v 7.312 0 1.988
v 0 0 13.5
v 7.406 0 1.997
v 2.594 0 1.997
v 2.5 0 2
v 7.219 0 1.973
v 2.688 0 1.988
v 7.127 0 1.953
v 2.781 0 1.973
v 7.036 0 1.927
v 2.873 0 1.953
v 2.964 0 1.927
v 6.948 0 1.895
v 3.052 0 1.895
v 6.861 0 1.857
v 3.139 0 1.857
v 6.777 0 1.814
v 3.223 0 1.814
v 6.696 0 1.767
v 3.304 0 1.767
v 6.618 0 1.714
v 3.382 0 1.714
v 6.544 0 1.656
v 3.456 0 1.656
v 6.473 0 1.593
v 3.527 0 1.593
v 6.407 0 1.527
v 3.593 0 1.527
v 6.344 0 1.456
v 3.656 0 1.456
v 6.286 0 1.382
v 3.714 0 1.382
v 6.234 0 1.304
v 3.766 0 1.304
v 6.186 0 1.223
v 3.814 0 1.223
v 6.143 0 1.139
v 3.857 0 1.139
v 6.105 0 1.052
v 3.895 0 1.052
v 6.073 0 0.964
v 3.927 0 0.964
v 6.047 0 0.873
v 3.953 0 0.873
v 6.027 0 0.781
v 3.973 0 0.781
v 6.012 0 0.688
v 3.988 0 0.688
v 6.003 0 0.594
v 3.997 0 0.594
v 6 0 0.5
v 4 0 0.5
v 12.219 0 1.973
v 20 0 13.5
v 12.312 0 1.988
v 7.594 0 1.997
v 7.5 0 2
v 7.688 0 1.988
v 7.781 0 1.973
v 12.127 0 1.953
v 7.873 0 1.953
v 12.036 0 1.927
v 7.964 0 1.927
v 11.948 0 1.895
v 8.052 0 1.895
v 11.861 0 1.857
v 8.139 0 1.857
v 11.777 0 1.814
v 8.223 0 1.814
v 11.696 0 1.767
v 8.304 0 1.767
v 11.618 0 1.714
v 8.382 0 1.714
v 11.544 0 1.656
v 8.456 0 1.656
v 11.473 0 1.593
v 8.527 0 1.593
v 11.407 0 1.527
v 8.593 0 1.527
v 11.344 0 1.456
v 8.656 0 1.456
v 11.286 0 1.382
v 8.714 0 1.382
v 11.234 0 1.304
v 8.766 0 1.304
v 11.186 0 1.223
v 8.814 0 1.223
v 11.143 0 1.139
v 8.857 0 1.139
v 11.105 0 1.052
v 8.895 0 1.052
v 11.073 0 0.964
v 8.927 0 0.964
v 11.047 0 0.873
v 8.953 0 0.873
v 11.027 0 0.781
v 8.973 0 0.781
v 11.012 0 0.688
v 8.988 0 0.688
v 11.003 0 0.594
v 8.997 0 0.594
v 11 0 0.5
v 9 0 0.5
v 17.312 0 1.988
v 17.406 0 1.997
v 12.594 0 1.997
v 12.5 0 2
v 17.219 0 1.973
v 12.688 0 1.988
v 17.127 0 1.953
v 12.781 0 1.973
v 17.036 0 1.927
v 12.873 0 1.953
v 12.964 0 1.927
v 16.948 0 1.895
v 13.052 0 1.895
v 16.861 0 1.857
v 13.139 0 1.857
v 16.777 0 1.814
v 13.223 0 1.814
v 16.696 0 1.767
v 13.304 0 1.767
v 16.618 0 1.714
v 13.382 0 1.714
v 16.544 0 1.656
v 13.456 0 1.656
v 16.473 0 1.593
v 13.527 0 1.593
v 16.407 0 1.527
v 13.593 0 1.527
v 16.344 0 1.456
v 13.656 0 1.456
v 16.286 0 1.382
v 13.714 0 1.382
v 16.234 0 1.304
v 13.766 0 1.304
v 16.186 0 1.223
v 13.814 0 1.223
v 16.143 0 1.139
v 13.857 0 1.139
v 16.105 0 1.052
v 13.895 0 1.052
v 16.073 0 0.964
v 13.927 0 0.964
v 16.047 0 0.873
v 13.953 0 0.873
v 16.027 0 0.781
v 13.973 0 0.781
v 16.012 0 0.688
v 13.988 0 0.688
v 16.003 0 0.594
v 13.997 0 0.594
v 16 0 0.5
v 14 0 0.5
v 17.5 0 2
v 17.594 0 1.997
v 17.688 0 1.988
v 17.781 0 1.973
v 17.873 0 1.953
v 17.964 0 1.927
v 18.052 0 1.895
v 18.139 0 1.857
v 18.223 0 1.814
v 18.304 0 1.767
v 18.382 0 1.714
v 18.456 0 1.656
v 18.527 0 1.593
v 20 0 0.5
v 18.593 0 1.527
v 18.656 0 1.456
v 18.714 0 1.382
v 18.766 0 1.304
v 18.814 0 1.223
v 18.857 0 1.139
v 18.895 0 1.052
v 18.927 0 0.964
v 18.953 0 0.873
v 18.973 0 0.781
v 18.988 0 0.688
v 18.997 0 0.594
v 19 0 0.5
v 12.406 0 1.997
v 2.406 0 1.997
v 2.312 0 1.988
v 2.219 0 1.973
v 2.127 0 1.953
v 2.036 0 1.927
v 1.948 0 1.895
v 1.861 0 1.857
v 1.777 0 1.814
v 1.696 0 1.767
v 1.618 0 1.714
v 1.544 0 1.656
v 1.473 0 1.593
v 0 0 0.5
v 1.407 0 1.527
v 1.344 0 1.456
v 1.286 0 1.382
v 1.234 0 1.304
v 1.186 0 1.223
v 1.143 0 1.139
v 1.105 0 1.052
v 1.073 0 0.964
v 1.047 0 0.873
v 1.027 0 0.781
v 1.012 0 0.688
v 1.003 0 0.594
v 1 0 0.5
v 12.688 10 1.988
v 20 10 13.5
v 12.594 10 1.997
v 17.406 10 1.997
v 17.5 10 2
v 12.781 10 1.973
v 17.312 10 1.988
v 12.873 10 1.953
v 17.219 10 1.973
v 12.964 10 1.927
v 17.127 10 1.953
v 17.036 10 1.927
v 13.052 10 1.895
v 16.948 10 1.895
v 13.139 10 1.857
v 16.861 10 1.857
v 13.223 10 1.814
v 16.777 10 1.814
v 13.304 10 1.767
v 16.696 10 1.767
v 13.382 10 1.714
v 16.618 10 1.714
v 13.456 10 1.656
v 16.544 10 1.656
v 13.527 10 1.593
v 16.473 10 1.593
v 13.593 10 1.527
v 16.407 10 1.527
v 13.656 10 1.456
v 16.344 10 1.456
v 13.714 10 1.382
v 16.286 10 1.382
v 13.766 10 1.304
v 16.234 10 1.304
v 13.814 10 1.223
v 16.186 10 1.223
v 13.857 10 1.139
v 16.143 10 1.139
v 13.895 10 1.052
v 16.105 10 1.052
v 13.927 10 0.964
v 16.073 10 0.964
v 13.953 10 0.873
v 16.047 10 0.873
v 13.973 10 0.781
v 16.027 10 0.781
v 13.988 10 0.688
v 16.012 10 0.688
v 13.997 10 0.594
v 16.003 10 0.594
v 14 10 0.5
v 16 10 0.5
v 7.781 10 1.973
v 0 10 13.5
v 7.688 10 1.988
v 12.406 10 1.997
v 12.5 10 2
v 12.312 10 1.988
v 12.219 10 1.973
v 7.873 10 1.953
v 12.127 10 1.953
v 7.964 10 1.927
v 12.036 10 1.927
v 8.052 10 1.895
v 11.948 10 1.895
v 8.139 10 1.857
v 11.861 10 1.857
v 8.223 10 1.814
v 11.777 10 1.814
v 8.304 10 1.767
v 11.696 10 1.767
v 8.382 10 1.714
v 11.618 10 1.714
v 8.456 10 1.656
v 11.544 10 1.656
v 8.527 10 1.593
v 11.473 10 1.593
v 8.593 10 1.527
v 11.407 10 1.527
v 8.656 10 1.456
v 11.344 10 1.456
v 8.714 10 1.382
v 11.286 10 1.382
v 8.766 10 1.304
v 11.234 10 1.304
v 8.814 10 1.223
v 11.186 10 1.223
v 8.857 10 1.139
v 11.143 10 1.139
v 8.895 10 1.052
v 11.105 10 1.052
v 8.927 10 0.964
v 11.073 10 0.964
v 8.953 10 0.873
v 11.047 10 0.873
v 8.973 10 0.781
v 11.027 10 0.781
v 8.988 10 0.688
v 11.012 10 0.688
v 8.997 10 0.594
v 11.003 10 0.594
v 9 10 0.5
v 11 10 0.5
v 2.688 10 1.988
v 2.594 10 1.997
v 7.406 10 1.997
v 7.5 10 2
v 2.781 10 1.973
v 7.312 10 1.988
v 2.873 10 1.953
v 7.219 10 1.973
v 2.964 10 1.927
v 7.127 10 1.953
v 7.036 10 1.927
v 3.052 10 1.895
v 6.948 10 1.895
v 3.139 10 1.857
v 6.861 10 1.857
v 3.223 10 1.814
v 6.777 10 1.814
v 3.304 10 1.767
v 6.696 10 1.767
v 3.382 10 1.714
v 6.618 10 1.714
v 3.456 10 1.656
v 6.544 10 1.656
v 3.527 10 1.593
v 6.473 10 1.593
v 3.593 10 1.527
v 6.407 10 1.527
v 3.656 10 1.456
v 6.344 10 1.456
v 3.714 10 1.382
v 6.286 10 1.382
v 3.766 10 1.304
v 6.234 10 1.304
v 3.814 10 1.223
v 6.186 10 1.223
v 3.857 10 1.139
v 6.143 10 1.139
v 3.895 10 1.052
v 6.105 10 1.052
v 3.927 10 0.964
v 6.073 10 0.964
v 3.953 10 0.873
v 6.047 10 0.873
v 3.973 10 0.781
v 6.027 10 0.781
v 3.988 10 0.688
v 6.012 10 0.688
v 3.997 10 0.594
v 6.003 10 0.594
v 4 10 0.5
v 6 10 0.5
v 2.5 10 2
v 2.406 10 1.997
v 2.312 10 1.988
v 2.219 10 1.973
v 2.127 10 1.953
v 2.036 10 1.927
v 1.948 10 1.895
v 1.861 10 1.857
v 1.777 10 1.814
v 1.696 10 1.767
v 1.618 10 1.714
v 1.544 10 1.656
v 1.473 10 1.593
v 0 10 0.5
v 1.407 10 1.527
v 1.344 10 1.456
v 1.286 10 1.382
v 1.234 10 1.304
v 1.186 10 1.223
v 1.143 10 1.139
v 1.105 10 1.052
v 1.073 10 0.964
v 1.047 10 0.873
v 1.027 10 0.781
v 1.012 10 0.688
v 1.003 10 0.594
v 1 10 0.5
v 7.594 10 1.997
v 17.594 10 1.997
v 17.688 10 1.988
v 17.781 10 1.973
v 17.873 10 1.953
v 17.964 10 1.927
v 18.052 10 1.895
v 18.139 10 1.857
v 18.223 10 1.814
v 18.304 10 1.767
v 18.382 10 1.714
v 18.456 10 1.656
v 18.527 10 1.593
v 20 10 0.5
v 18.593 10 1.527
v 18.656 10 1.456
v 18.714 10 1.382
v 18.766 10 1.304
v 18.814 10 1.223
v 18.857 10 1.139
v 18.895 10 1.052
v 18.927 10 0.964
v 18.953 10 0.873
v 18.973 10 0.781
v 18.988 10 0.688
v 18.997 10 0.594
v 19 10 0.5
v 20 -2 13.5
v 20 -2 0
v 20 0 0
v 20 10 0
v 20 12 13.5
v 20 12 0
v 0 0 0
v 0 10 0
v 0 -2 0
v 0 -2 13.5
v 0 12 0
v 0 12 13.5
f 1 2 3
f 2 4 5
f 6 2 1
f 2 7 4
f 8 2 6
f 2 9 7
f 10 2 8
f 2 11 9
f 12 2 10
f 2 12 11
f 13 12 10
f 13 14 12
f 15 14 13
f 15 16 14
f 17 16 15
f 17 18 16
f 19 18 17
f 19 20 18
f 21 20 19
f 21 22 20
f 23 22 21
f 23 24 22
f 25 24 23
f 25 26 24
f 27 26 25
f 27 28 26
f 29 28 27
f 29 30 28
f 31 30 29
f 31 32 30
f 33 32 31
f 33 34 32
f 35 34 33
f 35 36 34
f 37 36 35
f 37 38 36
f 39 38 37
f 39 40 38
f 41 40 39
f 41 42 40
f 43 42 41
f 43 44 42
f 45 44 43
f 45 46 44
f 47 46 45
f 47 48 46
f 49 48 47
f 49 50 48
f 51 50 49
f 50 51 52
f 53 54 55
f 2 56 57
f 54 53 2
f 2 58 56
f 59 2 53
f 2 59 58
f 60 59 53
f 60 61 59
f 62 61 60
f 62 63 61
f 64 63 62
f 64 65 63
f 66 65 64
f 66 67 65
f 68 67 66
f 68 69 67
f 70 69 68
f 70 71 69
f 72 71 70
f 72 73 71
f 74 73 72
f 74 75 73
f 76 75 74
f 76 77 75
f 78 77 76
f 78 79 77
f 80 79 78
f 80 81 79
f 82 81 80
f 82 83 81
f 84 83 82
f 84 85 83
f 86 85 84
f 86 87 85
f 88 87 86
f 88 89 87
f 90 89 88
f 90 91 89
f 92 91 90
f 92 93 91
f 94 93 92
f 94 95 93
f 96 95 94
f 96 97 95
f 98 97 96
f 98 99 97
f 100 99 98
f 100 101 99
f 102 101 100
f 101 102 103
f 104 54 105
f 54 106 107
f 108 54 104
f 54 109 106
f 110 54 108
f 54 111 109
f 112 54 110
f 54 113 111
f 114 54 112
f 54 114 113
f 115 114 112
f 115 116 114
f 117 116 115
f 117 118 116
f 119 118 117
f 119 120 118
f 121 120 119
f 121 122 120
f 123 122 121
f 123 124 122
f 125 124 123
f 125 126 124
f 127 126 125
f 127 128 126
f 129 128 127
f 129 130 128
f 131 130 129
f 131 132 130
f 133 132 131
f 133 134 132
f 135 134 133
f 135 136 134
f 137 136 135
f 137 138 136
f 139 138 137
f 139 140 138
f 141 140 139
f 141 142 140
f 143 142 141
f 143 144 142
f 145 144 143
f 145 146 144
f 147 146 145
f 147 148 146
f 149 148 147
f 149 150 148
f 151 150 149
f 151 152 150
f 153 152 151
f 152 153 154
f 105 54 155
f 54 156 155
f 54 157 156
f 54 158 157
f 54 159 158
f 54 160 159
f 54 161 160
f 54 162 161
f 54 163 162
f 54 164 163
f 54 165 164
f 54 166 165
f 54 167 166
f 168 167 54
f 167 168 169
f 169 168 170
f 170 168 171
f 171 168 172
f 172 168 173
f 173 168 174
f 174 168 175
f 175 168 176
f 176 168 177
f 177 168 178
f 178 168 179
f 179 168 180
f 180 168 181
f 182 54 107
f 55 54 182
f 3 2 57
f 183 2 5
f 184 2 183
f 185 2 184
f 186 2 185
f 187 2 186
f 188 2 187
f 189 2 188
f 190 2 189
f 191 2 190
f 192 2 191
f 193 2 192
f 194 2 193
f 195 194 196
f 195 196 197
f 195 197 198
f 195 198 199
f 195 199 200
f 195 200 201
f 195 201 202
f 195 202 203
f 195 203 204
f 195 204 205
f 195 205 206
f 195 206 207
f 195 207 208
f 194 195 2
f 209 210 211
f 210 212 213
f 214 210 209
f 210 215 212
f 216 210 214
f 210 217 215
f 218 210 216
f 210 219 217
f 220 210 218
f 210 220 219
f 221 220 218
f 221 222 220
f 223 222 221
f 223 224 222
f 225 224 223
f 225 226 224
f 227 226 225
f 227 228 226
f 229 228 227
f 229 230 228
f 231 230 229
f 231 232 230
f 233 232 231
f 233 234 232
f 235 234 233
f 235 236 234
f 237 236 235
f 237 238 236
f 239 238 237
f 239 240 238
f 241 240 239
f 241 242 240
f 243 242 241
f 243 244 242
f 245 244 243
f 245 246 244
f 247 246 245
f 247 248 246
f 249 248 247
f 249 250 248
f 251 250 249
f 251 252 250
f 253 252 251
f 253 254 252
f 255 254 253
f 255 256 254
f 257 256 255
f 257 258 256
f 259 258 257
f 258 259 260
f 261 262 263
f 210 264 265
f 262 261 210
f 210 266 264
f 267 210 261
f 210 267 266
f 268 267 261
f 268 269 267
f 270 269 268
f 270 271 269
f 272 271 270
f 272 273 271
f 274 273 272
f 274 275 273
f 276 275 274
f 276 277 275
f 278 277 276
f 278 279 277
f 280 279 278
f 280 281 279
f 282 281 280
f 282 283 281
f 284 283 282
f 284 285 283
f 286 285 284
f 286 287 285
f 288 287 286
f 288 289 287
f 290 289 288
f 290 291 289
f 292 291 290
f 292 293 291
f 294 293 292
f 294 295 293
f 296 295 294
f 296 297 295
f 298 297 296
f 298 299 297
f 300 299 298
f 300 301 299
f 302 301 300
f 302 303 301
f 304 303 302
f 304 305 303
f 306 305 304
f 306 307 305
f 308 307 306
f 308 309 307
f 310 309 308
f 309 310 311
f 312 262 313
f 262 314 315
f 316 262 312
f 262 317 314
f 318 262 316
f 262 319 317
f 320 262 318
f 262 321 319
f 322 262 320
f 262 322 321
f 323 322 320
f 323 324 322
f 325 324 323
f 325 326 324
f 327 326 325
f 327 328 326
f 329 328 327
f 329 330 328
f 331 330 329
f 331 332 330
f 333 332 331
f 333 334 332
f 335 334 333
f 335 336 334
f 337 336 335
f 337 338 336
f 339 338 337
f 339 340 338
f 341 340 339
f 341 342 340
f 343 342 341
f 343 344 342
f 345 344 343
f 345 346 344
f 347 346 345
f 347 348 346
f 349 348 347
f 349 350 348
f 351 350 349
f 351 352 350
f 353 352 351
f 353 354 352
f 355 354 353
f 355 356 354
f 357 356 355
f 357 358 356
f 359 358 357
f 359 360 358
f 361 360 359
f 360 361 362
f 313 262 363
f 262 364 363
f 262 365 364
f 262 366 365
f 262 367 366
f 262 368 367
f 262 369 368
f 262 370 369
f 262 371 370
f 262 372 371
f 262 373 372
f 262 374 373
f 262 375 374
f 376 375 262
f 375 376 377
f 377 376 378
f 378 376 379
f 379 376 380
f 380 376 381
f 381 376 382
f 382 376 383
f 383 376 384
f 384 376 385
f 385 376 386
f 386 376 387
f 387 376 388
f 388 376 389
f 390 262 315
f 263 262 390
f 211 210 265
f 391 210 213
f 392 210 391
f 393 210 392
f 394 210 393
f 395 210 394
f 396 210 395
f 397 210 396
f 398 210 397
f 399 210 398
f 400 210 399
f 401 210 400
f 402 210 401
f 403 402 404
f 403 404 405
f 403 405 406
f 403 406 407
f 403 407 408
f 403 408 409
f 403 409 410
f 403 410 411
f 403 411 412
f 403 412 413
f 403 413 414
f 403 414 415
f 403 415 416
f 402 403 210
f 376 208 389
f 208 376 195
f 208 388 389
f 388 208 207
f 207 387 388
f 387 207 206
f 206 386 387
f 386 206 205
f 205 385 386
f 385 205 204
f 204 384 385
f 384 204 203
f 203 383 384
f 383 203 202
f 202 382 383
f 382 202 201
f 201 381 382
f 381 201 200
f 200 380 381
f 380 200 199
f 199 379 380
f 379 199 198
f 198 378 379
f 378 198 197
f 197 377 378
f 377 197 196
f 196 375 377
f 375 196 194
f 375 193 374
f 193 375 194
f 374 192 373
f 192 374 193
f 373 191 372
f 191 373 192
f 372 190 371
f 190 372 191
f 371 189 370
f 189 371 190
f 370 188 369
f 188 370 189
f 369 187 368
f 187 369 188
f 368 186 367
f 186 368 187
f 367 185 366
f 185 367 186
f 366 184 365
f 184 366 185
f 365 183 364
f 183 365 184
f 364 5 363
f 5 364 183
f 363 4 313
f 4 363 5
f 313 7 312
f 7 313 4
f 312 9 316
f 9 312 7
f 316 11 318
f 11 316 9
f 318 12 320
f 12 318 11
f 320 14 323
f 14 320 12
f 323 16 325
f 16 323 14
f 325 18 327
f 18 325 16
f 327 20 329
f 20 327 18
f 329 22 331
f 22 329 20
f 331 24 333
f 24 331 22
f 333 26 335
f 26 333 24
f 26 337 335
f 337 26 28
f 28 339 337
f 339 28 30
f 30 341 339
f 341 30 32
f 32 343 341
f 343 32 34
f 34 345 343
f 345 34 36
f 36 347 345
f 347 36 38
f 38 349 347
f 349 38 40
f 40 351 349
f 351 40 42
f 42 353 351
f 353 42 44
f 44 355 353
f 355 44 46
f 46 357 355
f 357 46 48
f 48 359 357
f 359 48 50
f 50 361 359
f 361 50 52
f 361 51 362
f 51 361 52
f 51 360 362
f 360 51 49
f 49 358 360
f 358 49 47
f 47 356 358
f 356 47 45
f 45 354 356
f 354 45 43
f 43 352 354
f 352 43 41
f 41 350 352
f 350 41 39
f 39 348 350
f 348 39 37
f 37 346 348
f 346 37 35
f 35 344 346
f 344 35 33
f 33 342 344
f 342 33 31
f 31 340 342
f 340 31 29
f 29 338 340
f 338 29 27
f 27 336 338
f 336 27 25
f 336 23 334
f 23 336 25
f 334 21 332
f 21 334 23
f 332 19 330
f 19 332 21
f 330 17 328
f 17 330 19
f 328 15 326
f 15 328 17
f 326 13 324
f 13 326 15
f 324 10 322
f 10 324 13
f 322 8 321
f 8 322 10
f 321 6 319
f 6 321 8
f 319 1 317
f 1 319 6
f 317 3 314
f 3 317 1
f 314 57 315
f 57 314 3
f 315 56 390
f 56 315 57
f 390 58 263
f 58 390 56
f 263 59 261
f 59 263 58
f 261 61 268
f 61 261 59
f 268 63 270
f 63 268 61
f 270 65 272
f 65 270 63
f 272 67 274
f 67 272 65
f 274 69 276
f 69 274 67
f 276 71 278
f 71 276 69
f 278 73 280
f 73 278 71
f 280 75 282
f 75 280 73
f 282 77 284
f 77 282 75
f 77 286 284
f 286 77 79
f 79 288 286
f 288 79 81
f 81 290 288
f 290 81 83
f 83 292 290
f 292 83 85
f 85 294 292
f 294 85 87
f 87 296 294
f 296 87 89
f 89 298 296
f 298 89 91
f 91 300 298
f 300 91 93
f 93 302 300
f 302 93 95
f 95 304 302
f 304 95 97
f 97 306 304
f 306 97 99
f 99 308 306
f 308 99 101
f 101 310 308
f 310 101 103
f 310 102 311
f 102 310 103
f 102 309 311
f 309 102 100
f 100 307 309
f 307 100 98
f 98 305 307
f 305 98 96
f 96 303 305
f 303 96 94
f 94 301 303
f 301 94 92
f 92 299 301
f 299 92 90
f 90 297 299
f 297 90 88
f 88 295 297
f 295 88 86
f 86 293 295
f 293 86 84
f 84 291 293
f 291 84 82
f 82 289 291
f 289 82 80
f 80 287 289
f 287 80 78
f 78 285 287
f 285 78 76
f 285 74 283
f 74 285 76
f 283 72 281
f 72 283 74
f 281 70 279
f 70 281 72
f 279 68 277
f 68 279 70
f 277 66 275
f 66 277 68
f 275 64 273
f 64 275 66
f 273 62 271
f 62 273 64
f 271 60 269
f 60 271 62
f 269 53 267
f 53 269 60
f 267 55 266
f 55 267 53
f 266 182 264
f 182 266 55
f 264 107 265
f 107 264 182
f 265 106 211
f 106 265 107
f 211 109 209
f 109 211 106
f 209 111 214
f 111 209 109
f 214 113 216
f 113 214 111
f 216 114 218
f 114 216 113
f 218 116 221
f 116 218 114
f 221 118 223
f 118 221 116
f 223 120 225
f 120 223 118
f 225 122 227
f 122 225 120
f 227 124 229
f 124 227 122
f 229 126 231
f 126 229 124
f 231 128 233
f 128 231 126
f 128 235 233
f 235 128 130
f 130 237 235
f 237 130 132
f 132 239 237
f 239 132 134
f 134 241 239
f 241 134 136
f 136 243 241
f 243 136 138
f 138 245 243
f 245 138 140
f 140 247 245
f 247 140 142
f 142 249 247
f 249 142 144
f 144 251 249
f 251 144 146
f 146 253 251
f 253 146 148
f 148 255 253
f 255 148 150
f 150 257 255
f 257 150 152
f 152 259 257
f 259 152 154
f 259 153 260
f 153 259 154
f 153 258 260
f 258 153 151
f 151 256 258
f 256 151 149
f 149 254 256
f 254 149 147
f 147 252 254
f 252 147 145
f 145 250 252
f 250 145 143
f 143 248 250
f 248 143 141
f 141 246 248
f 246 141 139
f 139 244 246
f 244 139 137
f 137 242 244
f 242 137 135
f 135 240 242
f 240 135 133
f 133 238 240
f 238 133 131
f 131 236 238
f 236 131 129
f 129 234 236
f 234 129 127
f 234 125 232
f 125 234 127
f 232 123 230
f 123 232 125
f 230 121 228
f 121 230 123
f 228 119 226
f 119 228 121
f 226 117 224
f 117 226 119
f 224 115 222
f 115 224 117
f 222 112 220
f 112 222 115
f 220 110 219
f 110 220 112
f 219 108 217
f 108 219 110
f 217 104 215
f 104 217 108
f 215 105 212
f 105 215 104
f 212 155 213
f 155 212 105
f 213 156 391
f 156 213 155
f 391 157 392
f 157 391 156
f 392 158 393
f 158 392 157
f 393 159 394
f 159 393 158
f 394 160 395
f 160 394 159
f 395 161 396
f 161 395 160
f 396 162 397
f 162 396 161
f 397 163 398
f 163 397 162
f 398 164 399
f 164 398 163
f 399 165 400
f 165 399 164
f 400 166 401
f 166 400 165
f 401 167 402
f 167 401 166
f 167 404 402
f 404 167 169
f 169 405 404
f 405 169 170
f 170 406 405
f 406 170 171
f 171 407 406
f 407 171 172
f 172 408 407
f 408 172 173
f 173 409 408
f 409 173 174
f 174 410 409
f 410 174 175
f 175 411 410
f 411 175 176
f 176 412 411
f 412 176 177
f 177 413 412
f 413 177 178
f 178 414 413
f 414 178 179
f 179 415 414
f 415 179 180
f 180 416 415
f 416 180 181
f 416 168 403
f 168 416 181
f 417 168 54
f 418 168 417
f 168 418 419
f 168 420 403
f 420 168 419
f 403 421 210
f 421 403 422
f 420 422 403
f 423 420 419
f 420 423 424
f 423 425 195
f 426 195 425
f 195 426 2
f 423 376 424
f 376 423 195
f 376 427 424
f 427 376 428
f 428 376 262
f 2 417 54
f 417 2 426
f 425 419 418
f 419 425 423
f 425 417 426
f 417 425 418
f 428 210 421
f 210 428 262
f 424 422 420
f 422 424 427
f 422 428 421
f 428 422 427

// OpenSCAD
$fn=100;
long_trou=3;
long_bosse=2;
long_totale=long_trou+long_bosse;

largeur_courroie=10;
hauteur_courroie=2.4;

epaisseur_plaque=0.5;

module dent() {
	difference() {
		square([long_totale,hauteur_courroie]);
		translate([long_totale/2,hauteur_courroie]) circle(d=long_trou);
	}
}
module dent_inverse() {
	difference() {
		square([long_totale,hauteur_courroie+epaisseur_plaque]);
		dent();
	}
}

module courroie_inverse(dents) {
	for(i=[0:dents-1])
		translate([i*long_totale,0,0])dent_inverse();
}


translate([0,0,hauteur_courroie+epaisseur_plaque]) rotate([-90,0,0])
	linear_extrude(height=largeur_courroie) courroie_inverse(4);

epaisseur_supports=2;
hauteur_supports=13.5;
translate([0,-epaisseur_supports])
	cube([4*long_totale,epaisseur_supports,hauteur_supports]);
translate([0,largeur_courroie])
	cube([4*long_totale,epaisseur_supports,hauteur_supports]);
